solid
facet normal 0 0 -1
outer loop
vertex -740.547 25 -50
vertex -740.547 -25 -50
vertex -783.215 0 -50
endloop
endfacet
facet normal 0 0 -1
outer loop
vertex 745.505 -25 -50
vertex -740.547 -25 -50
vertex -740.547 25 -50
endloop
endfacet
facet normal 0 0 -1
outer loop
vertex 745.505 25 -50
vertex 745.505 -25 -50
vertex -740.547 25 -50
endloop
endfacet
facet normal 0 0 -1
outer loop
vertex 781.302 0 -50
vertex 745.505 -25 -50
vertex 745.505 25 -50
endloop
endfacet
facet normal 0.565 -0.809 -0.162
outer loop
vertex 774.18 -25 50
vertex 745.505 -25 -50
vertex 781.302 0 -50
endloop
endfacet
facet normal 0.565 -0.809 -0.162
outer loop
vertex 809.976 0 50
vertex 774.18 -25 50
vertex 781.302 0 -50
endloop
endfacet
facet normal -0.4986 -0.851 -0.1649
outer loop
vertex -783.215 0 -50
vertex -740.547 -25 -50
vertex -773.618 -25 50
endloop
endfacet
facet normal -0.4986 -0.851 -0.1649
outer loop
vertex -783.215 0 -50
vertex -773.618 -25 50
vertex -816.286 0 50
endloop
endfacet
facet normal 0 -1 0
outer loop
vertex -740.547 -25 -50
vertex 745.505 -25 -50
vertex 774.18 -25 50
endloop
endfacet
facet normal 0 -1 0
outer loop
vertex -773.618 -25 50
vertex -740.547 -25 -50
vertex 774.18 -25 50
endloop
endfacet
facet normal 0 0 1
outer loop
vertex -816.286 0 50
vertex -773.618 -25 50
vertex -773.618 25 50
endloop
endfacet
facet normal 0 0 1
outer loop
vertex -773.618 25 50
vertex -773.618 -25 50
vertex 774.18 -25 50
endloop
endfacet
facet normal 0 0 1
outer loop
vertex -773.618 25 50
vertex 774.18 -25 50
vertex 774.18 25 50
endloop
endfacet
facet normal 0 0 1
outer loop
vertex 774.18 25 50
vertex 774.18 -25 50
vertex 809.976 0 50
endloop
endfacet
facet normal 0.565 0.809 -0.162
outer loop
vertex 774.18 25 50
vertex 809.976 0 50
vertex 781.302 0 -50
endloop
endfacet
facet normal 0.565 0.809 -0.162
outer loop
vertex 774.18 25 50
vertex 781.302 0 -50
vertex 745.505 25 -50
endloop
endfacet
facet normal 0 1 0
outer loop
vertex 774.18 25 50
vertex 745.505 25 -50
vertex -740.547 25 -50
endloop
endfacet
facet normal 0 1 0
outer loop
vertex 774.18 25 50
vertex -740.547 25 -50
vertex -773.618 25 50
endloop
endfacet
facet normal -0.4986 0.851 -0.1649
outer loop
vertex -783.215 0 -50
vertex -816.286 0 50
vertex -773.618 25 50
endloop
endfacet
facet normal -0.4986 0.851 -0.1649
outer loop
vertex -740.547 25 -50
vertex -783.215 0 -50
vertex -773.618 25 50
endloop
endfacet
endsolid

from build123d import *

# Parameters (mm, degrees)
F0_W        = 50
F0_H        = 100
F1_DEPTH    = 819.225
F3_DEPTH    = 50.001
F4_T1_DEPTH = 327.5939866368
F4_T3_DEPTH = 327.5939866368
F5_T1_DEPTH = 329.2426603123
F5_T3_DEPTH = 329.2426603123


# Not quite as in the source:
# - a fillet or chamfer that OpenCascade refuses, or shapes differently, is made with other operations: its cross-section is extruded or revolved along the edge and cut away or added


with BuildPart() as f1:
    # F0 (on Right) → F1 (new body, symmetric)
    with BuildSketch(Plane.YZ):
        Rectangle(F0_W, F0_H)
    extrude(amount=F1_DEPTH, both=True)

    # F2 (on face) → F3 (cut, through all)
    with BuildSketch(Plane.XZ.offset(25)):
        Polygon((819.225, -50), (819.225, 50), (790.5504614241, -50), align=None)
        Polygon((-786.1531619925, -50), (-819.225, 50), (-819.225, -50), align=None)
    extrude(amount=-F3_DEPTH, mode=Mode.SUBTRACT)

    # F4: chamfer of 43.3 x 31.4592914626 on 2 edges, made by hand

    # F4_s2 → F4_t1 (cut)
    with BuildSketch(Plane(origin=(106.3006816601, 0, 370.7145326115), x_dir=(0, 1, 0), z_dir=(-0.2756373558, 0, -0.9612616959))):
        Polygon((-25, 730.4077450642), (6.4592914626, 773.7077450642), (-25, 773.7077450642), align=None)
    extrude(amount=F4_T1_DEPTH, mode=Mode.SUBTRACT)

    # F4_s4 → F4_t3 (cut)
    with BuildSketch(Plane(origin=(16.003541402, 0, 55.8109814378), x_dir=(0, 1, 0), z_dir=(0.2756373558, 0, 0.9612616959))):
        Polygon((-6.4592914626, -773.7077450642), (25, -730.4077450642), (25, -773.7077450642), align=None)
    extrude(amount=F4_T3_DEPTH, mode=Mode.SUBTRACT)

    # F5: chamfer of 43.3 x 26.721749628 on 2 edges, made by hand

    # F5_s2 → F5_t1 (cut)
    with BuildSketch(Plane(origin=(-130.827985574, 0, 395.5872834902), x_dir=(0, 1, 0), z_dir=(0.313992456, 0, -0.9494254776))):
        Polygon((-1.721749628, -762.0934641228), (25, -718.7934641228), (25, -762.0934641228), align=None)
    extrude(amount=F5_T1_DEPTH, mode=Mode.SUBTRACT)

    # F5_s4 → F5_t3 (cut)
    with BuildSketch(Plane(origin=(-27.4482740533, 0, 82.9959134631), x_dir=(0, 1, 0), z_dir=(-0.313992456, 0, 0.9494254776))):
        Polygon((-25, 718.7934641228), (1.721749628, 762.0934641228), (-25, 762.0934641228), align=None)
    extrude(amount=F5_T3_DEPTH, mode=Mode.SUBTRACT)


solid = f1.part
